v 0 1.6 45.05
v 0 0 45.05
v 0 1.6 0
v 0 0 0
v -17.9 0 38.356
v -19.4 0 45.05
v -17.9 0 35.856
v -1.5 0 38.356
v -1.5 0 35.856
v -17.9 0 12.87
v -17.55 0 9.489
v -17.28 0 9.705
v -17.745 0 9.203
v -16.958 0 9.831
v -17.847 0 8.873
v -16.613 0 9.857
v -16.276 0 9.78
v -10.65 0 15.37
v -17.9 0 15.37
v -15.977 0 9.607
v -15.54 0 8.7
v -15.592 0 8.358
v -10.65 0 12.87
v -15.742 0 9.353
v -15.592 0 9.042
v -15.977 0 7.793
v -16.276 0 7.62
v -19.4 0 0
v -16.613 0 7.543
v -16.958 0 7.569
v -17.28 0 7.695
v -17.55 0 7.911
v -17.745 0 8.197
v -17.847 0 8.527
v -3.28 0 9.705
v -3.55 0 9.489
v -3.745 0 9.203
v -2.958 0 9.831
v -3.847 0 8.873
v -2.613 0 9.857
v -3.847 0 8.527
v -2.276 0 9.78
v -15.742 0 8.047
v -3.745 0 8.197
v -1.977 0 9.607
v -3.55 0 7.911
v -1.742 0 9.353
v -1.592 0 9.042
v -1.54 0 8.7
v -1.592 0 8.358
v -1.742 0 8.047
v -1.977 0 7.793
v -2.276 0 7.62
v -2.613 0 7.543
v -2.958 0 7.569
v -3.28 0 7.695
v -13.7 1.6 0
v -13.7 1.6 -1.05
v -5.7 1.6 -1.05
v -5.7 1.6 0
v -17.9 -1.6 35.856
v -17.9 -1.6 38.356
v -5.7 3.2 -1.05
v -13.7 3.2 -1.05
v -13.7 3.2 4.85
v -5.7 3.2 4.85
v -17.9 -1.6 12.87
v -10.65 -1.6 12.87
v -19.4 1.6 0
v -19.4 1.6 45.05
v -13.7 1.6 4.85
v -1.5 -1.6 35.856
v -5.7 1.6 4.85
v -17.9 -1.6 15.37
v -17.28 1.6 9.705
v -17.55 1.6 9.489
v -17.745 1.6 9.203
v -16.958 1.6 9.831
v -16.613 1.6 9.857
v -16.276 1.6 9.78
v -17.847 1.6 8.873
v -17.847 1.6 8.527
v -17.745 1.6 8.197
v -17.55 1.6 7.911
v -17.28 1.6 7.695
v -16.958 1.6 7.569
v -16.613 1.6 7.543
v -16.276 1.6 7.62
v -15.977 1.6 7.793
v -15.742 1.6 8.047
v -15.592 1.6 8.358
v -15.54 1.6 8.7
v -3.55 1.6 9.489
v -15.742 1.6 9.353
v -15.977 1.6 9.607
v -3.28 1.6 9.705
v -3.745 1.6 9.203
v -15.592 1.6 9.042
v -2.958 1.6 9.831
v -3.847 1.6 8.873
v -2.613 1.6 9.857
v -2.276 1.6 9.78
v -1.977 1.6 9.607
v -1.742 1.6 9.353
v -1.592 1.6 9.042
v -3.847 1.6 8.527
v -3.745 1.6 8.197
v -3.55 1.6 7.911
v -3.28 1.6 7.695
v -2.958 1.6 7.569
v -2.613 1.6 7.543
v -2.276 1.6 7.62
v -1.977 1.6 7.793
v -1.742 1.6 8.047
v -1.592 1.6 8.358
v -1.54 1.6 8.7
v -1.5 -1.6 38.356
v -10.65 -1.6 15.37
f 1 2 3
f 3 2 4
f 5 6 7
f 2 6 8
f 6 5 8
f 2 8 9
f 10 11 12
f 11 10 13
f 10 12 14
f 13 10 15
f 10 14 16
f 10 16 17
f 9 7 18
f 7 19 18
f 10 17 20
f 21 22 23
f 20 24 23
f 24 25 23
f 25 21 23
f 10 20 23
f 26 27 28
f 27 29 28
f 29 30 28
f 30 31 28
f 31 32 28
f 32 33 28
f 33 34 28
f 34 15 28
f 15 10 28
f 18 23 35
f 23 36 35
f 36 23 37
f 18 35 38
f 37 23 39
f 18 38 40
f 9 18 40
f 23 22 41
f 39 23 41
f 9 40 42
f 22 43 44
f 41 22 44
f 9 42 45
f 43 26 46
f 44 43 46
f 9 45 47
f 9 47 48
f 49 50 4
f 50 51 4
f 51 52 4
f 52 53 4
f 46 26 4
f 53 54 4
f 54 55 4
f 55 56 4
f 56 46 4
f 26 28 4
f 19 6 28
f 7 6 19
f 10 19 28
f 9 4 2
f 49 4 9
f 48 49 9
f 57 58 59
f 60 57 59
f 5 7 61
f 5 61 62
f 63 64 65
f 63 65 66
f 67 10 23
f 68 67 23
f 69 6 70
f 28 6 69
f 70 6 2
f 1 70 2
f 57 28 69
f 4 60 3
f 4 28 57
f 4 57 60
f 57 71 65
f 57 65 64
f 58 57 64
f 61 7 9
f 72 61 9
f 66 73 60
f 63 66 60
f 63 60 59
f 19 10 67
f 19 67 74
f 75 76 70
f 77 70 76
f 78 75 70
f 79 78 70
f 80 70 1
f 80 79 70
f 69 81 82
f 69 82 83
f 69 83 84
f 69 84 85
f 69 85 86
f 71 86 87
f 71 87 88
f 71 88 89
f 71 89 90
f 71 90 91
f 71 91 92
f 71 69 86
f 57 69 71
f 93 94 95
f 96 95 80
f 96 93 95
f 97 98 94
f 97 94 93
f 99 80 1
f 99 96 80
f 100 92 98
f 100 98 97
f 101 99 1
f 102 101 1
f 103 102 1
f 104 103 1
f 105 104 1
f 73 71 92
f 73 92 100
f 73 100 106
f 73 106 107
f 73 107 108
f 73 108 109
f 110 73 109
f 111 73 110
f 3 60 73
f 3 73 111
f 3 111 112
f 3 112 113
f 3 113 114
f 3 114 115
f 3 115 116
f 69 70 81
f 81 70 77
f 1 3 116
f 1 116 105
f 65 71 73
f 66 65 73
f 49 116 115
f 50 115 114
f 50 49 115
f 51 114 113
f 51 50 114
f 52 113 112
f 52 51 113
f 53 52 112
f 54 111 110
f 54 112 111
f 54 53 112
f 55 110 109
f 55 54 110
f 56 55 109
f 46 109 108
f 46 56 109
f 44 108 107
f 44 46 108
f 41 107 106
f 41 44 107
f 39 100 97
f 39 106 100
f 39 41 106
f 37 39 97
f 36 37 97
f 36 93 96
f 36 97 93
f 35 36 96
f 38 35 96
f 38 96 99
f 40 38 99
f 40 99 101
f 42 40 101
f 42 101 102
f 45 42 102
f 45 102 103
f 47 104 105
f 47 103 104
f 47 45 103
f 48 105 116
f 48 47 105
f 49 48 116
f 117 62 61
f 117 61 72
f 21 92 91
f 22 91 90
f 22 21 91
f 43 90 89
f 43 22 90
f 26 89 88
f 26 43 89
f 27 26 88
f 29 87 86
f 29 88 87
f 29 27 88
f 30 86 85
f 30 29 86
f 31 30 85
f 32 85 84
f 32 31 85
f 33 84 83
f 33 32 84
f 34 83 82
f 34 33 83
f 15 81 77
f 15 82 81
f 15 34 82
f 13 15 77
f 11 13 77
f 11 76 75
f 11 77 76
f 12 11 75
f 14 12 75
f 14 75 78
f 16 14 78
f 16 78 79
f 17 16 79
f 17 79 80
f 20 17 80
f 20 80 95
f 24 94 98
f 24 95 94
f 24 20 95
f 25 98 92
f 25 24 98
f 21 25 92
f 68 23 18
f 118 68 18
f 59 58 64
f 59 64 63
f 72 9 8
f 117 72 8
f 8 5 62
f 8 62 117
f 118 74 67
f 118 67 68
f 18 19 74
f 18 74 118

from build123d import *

# Parameters (mm, degrees)
SKETCH1_W           = 19.4
SKETCH1_H           = 45.05
BOSS_EXTRUDE1_DEPTH = 1.6
SKETCH2_W           = 8
SKETCH2_H           = 5.9
BOSS_EXTRUDE2_DEPTH = 1.6
SKETCH3_R           = 1.16
CUT_EXTRUDE3_DEPTH  = 4.2
SKETCH4_W           = 7.25
SKETCH4_H           = 2.5
SKETCH4_W_2         = 16.4
BOSS_EXTRUDE3_DEPTH = 1.6


with BuildPart() as part:
    # Sketch1 → Boss-Extrude1 (new body)
    with BuildSketch(Plane(origin=(0, 0, 0), x_dir=(1, 0, 0), z_dir=(0, 1, 0))):
        with Locations((-9.7, -22.525)):
            Rectangle(SKETCH1_W, SKETCH1_H)
    extrude(amount=BOSS_EXTRUDE1_DEPTH)

    # Sketch2 → Boss-Extrude2 (add)
    with BuildSketch(Plane(origin=(0, 1.6, 0), x_dir=(1, 0, 0), z_dir=(0, 1, 0))):
        with Locations((-9.7, -1.9)):
            Rectangle(SKETCH2_W, SKETCH2_H)
    extrude(amount=BOSS_EXTRUDE2_DEPTH)

    # Sketch3 → Cut-Extrude3 (cut, through all)
    with BuildSketch(Plane(origin=(0, 0, 0), x_dir=(1, 0, 0), z_dir=(0, 1, 0))):
        with Locations((-16.7, -8.7)):
            Circle(SKETCH3_R)
        with Locations((-2.7, -8.7)):
            Circle(SKETCH3_R)
    extrude(amount=CUT_EXTRUDE3_DEPTH, mode=Mode.SUBTRACT)

    # Sketch4 → Boss-Extrude3 (add)
    with BuildSketch(Plane.XZ):
        with Locations((-14.275, 14.12)):
            Rectangle(SKETCH4_W, SKETCH4_H)
        with Locations((-9.7, 37.106432009)):
            Rectangle(SKETCH4_W_2, SKETCH4_H)
    extrude(amount=BOSS_EXTRUDE3_DEPTH)


solid = part.part
